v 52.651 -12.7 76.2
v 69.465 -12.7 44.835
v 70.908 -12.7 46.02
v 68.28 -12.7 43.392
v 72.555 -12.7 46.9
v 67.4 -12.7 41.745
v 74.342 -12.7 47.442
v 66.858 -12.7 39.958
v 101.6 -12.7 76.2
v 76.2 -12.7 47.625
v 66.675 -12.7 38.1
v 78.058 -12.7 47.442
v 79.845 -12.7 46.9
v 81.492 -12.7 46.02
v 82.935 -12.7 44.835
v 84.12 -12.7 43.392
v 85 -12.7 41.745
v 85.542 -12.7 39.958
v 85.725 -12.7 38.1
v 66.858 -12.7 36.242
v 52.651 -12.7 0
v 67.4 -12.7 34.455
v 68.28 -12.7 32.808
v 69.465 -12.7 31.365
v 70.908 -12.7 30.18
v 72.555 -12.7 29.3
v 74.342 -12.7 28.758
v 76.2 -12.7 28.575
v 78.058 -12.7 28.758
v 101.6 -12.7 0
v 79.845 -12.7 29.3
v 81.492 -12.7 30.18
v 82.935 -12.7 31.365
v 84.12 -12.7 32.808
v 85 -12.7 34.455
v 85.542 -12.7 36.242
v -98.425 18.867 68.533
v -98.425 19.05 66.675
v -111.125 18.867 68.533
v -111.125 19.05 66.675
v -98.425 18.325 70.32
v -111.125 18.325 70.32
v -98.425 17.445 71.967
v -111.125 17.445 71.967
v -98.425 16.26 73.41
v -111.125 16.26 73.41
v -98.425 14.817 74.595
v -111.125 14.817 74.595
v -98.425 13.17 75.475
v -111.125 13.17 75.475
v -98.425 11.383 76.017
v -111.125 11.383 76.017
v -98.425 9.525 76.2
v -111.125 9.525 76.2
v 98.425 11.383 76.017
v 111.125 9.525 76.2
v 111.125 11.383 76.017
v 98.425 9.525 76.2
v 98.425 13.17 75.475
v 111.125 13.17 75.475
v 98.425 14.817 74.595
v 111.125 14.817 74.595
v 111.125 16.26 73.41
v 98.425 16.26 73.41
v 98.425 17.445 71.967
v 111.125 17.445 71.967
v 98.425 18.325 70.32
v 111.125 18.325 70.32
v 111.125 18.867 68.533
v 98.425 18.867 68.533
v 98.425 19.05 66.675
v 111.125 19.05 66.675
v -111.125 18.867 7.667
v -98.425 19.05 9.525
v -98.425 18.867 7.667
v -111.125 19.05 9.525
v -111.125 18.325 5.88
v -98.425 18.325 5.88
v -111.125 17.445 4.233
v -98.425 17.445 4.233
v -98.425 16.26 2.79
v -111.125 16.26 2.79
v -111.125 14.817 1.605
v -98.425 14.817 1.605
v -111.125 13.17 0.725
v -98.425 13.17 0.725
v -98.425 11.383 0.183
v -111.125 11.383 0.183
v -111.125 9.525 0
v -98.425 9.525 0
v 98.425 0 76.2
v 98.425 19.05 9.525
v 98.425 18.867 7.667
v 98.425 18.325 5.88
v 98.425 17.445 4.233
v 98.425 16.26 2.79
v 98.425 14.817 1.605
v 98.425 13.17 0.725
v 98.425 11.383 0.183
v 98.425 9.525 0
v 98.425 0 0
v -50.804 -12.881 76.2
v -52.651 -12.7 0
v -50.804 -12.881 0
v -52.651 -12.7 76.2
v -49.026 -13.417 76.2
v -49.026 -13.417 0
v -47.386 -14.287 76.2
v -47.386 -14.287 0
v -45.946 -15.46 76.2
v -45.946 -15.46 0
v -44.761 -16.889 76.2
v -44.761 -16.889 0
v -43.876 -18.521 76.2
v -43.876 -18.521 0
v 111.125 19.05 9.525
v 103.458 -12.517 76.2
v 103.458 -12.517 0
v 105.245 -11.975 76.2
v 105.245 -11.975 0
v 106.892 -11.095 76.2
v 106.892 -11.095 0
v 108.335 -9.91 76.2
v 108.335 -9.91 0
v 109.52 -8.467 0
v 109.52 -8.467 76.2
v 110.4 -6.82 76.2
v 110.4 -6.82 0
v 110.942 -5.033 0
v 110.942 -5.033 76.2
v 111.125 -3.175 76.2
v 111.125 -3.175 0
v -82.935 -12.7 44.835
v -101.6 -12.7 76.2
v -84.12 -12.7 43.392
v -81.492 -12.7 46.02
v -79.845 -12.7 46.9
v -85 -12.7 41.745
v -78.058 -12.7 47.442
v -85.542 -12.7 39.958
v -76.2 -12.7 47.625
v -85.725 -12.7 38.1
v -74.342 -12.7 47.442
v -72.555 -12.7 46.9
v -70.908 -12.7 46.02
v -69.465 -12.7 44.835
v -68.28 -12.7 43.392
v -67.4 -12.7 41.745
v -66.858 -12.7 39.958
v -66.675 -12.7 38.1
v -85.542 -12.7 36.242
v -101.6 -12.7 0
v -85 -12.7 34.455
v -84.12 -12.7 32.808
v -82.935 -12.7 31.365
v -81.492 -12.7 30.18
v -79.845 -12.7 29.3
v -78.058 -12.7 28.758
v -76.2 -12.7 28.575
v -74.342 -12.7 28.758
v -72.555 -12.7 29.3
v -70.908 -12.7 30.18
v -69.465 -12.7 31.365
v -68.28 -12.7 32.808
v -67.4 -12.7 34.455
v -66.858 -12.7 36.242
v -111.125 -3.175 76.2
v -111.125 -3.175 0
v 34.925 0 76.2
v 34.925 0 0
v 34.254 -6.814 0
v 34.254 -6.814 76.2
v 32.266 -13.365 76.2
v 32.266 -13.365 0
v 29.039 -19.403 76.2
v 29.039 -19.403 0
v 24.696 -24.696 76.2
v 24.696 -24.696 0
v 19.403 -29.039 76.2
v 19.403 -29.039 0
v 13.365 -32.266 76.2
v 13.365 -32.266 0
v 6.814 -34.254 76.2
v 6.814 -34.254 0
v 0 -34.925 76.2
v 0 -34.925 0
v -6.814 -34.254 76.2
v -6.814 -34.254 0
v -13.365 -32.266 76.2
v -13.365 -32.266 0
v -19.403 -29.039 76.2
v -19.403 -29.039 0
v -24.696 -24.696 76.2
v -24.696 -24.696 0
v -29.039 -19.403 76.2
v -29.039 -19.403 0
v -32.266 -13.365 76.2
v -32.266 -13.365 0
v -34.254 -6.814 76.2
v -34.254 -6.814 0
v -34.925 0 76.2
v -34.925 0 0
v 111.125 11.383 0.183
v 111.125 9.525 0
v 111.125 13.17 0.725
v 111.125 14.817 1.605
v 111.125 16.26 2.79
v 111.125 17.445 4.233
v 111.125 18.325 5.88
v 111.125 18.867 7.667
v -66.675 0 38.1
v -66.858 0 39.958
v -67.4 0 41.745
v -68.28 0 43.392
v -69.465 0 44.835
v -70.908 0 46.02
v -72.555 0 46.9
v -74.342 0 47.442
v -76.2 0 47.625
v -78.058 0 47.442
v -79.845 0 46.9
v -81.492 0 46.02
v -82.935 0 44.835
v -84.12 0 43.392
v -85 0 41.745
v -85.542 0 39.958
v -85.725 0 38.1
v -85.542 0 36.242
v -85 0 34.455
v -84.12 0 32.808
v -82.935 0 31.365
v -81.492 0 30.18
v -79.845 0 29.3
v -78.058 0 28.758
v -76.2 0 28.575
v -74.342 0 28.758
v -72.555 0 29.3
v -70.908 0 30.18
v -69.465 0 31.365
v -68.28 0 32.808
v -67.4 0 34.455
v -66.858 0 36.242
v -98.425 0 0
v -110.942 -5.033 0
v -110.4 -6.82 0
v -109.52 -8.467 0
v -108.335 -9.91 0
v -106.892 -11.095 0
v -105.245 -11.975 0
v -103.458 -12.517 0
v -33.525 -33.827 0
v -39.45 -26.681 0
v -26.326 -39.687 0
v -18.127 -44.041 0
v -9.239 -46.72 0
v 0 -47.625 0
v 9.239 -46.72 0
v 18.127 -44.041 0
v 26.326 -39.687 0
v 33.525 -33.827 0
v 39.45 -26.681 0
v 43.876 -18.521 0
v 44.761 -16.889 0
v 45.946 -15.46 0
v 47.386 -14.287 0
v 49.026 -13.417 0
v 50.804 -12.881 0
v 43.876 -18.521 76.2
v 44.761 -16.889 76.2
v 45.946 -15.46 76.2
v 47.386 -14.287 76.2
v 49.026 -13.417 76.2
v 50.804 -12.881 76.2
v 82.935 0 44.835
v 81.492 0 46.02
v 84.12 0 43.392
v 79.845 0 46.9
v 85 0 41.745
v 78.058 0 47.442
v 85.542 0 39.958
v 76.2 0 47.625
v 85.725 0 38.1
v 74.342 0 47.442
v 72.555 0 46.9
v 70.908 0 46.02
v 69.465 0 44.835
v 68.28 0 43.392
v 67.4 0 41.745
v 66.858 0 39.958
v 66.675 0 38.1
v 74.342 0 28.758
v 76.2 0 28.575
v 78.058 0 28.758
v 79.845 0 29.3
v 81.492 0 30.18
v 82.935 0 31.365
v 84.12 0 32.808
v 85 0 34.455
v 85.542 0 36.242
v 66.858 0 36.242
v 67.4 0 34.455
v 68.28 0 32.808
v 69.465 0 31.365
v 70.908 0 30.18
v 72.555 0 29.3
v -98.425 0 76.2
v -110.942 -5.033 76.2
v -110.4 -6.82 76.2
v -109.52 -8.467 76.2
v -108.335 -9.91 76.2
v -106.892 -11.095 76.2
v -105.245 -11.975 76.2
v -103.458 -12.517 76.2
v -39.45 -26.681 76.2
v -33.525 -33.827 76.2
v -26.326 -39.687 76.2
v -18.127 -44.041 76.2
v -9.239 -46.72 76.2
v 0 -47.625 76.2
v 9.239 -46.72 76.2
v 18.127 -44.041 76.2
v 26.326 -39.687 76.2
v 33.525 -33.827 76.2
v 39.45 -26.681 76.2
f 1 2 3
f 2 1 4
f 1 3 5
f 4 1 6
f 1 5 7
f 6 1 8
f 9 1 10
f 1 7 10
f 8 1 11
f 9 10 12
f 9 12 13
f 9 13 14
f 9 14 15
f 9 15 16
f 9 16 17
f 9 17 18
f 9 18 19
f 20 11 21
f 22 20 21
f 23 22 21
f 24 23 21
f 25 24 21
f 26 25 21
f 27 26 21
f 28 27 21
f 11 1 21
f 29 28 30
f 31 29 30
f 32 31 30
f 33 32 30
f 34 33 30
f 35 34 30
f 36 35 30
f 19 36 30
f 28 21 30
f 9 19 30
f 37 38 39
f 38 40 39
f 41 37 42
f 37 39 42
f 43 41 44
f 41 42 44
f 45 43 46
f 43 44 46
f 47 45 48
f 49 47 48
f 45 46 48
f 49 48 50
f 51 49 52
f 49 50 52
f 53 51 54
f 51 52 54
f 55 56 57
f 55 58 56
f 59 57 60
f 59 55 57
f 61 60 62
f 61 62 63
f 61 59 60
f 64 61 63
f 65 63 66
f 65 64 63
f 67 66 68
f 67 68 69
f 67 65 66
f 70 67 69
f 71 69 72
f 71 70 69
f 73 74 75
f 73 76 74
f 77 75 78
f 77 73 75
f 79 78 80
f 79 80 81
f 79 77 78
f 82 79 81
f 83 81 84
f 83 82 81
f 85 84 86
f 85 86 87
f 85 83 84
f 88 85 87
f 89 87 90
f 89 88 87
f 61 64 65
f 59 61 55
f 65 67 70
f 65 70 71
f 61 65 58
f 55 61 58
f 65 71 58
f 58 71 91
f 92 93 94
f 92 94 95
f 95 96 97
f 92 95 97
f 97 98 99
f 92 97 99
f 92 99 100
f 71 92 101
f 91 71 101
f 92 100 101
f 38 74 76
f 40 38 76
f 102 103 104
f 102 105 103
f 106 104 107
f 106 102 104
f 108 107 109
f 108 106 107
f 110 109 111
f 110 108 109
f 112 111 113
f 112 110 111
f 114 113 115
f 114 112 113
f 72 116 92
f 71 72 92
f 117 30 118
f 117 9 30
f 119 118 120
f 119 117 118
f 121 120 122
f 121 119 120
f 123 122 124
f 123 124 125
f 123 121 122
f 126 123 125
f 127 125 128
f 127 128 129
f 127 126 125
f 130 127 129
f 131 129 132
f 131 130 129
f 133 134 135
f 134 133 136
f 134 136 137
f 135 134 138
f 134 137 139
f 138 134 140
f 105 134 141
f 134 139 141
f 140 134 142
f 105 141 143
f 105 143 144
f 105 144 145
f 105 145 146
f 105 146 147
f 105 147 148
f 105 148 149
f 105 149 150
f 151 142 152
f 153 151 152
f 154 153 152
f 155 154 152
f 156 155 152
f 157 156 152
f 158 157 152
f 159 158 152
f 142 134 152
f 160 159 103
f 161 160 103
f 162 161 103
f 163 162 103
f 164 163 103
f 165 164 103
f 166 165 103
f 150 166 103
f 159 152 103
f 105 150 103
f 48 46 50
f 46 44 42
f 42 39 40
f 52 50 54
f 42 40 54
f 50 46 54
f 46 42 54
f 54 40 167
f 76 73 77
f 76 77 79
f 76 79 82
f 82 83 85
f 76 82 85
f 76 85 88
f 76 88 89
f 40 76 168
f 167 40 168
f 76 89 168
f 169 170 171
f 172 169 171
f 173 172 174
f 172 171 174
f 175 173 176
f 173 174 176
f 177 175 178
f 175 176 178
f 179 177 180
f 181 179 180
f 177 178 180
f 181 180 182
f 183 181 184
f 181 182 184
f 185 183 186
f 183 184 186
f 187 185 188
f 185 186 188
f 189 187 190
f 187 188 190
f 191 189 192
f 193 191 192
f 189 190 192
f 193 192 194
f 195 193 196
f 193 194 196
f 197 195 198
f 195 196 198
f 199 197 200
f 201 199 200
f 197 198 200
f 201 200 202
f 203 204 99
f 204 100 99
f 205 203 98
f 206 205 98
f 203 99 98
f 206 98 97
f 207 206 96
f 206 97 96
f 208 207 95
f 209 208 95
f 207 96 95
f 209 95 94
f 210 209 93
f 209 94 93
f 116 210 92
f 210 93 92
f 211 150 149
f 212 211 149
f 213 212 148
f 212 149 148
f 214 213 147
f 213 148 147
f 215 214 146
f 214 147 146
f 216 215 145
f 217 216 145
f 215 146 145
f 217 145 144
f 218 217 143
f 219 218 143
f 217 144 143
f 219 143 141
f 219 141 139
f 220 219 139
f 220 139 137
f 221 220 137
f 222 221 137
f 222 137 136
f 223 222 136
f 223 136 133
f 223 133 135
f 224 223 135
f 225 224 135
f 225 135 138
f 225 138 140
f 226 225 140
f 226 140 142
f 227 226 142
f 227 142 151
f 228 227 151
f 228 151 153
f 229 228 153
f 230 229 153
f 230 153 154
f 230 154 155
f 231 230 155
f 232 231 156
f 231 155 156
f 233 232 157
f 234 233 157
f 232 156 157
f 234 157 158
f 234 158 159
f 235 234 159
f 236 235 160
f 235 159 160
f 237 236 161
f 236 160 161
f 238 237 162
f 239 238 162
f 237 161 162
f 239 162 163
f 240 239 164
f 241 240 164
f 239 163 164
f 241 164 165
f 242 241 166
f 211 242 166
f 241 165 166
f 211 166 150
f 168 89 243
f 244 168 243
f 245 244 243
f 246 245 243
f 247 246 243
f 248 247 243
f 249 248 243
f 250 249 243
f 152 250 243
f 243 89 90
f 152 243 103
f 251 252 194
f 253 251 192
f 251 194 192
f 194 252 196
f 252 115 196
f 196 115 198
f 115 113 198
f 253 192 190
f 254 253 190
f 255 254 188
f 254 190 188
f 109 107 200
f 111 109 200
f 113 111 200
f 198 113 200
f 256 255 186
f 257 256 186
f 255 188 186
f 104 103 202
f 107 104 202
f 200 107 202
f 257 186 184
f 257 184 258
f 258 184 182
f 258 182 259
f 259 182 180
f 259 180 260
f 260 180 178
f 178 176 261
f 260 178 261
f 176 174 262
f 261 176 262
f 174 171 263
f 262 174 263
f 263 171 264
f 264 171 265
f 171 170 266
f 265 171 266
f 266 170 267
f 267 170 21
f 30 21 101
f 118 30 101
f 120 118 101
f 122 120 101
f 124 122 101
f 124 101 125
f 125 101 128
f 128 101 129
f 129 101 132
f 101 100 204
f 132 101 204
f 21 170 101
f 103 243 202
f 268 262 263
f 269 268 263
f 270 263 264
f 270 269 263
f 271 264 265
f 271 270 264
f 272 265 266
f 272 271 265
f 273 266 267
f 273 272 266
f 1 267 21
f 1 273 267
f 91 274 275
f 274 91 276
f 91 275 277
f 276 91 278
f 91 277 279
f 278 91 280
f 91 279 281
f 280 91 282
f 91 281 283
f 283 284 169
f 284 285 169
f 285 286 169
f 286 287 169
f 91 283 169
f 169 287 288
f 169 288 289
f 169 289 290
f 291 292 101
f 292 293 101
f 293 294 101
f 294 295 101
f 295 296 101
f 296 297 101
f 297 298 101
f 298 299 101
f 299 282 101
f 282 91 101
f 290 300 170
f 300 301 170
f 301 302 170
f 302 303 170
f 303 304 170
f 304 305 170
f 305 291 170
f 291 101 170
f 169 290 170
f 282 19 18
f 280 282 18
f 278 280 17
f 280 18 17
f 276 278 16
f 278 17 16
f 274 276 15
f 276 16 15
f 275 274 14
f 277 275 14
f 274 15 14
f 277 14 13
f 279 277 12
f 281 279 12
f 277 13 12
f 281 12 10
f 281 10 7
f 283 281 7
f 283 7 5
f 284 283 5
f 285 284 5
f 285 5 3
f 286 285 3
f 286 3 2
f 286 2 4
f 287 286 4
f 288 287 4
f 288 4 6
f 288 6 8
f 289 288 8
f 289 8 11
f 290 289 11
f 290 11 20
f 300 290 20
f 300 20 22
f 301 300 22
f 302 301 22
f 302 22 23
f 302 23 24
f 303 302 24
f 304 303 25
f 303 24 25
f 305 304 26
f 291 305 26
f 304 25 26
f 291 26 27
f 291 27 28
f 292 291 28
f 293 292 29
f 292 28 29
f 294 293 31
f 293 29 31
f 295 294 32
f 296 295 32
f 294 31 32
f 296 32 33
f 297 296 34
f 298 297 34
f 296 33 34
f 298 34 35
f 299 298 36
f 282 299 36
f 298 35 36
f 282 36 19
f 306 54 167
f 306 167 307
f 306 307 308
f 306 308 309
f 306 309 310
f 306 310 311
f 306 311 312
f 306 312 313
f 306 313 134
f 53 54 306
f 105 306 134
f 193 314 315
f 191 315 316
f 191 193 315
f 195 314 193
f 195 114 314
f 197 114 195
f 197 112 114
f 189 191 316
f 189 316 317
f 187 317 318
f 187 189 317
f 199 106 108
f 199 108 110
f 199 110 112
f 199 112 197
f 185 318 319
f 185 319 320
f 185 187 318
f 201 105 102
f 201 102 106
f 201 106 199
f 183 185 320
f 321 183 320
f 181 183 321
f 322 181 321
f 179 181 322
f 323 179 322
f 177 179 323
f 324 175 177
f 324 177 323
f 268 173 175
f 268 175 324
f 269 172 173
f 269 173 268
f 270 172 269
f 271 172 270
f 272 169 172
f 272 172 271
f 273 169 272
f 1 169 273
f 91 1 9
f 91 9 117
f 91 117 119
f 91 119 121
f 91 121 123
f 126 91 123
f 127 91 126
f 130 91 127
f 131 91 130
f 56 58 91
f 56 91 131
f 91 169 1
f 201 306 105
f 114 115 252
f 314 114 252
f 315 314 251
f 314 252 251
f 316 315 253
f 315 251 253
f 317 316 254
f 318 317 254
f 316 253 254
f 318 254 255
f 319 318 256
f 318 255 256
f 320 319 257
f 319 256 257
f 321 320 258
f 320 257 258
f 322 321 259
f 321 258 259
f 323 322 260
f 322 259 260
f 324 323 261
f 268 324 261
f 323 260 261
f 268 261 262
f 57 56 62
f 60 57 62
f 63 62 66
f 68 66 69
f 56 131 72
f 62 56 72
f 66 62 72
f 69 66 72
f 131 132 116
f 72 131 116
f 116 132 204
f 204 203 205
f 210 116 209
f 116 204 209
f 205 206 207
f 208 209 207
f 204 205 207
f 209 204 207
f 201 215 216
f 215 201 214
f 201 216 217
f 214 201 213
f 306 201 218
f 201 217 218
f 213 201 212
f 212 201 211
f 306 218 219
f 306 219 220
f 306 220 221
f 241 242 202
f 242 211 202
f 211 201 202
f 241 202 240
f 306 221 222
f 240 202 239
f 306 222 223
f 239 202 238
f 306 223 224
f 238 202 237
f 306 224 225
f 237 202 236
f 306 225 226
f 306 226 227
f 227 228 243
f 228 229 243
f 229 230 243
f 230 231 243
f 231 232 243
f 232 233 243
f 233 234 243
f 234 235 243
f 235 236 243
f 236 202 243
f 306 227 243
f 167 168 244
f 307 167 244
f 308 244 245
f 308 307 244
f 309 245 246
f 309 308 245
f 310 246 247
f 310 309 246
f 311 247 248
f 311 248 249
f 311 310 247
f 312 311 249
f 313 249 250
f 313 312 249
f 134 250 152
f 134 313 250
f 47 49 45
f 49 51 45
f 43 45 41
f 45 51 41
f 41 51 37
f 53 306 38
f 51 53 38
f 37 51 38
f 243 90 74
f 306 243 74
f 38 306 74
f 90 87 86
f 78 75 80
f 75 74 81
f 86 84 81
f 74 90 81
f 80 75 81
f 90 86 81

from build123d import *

# Parameters (mm, degrees)
F1_DEPTH = 76.2
F2_R     = 9.525
F3_DEPTH = 31.751
F4_R     = 9.525


with BuildPart() as f1:
    # F0 (on Top) → F1 (new body)
    with BuildSketch(Plane.XY):
        with BuildLine():
            Line((-98.425, 19.05), (-111.125, 19.05))
            Line((-111.125, 19.05), (-111.125, -12.7))
            Line((-111.125, -12.7), (-45.900443, -12.7))
            ThreePointArc((-45.900443, -12.7), (0, -47.625), (45.900443, -12.7))
            Line((45.900443, -12.7), (111.125, -12.7))
            Line((111.125, -12.7), (111.125, 19.05))
            Line((111.125, 19.05), (98.425, 19.05))
            Line((98.425, 19.05), (98.425, 0))
            Line((98.425, 0), (34.925, 0))
            ThreePointArc((34.925, 0), (0, -34.925), (-34.925, 0))
            Line((-34.925, 0), (-98.425, 0))
            Line((-98.425, 0), (-98.425, 19.05))
        make_face()
    extrude(amount=F1_DEPTH)

    # F2 (on face) → F3 (cut, through all)
    with BuildSketch(Plane.XZ.offset(12.7)):
        with Locations((-76.2, 38.1)):
            Circle(F2_R)
        with Locations((76.2, 38.1)):
            Circle(F2_R)
    extrude(amount=-F3_DEPTH, mode=Mode.SUBTRACT)

    # F4
    f4_edges = [f1.edges().sort_by_distance(p)[0] for p in [
        (111.125, -12.7, 38.1),
        (45.900443, -12.7, 38.1),
        (-45.900443, -12.7, 38.1),
        (-111.125, -12.7, 38.1),
        (104.775, 19.05, 76.2),
        (-104.775, 19.05, 76.2),
        (104.775, 19.05, 0),
        (-104.775, 19.05, 0),
    ]]
    fillet(f4_edges, radius=F4_R)


solid = f1.part
